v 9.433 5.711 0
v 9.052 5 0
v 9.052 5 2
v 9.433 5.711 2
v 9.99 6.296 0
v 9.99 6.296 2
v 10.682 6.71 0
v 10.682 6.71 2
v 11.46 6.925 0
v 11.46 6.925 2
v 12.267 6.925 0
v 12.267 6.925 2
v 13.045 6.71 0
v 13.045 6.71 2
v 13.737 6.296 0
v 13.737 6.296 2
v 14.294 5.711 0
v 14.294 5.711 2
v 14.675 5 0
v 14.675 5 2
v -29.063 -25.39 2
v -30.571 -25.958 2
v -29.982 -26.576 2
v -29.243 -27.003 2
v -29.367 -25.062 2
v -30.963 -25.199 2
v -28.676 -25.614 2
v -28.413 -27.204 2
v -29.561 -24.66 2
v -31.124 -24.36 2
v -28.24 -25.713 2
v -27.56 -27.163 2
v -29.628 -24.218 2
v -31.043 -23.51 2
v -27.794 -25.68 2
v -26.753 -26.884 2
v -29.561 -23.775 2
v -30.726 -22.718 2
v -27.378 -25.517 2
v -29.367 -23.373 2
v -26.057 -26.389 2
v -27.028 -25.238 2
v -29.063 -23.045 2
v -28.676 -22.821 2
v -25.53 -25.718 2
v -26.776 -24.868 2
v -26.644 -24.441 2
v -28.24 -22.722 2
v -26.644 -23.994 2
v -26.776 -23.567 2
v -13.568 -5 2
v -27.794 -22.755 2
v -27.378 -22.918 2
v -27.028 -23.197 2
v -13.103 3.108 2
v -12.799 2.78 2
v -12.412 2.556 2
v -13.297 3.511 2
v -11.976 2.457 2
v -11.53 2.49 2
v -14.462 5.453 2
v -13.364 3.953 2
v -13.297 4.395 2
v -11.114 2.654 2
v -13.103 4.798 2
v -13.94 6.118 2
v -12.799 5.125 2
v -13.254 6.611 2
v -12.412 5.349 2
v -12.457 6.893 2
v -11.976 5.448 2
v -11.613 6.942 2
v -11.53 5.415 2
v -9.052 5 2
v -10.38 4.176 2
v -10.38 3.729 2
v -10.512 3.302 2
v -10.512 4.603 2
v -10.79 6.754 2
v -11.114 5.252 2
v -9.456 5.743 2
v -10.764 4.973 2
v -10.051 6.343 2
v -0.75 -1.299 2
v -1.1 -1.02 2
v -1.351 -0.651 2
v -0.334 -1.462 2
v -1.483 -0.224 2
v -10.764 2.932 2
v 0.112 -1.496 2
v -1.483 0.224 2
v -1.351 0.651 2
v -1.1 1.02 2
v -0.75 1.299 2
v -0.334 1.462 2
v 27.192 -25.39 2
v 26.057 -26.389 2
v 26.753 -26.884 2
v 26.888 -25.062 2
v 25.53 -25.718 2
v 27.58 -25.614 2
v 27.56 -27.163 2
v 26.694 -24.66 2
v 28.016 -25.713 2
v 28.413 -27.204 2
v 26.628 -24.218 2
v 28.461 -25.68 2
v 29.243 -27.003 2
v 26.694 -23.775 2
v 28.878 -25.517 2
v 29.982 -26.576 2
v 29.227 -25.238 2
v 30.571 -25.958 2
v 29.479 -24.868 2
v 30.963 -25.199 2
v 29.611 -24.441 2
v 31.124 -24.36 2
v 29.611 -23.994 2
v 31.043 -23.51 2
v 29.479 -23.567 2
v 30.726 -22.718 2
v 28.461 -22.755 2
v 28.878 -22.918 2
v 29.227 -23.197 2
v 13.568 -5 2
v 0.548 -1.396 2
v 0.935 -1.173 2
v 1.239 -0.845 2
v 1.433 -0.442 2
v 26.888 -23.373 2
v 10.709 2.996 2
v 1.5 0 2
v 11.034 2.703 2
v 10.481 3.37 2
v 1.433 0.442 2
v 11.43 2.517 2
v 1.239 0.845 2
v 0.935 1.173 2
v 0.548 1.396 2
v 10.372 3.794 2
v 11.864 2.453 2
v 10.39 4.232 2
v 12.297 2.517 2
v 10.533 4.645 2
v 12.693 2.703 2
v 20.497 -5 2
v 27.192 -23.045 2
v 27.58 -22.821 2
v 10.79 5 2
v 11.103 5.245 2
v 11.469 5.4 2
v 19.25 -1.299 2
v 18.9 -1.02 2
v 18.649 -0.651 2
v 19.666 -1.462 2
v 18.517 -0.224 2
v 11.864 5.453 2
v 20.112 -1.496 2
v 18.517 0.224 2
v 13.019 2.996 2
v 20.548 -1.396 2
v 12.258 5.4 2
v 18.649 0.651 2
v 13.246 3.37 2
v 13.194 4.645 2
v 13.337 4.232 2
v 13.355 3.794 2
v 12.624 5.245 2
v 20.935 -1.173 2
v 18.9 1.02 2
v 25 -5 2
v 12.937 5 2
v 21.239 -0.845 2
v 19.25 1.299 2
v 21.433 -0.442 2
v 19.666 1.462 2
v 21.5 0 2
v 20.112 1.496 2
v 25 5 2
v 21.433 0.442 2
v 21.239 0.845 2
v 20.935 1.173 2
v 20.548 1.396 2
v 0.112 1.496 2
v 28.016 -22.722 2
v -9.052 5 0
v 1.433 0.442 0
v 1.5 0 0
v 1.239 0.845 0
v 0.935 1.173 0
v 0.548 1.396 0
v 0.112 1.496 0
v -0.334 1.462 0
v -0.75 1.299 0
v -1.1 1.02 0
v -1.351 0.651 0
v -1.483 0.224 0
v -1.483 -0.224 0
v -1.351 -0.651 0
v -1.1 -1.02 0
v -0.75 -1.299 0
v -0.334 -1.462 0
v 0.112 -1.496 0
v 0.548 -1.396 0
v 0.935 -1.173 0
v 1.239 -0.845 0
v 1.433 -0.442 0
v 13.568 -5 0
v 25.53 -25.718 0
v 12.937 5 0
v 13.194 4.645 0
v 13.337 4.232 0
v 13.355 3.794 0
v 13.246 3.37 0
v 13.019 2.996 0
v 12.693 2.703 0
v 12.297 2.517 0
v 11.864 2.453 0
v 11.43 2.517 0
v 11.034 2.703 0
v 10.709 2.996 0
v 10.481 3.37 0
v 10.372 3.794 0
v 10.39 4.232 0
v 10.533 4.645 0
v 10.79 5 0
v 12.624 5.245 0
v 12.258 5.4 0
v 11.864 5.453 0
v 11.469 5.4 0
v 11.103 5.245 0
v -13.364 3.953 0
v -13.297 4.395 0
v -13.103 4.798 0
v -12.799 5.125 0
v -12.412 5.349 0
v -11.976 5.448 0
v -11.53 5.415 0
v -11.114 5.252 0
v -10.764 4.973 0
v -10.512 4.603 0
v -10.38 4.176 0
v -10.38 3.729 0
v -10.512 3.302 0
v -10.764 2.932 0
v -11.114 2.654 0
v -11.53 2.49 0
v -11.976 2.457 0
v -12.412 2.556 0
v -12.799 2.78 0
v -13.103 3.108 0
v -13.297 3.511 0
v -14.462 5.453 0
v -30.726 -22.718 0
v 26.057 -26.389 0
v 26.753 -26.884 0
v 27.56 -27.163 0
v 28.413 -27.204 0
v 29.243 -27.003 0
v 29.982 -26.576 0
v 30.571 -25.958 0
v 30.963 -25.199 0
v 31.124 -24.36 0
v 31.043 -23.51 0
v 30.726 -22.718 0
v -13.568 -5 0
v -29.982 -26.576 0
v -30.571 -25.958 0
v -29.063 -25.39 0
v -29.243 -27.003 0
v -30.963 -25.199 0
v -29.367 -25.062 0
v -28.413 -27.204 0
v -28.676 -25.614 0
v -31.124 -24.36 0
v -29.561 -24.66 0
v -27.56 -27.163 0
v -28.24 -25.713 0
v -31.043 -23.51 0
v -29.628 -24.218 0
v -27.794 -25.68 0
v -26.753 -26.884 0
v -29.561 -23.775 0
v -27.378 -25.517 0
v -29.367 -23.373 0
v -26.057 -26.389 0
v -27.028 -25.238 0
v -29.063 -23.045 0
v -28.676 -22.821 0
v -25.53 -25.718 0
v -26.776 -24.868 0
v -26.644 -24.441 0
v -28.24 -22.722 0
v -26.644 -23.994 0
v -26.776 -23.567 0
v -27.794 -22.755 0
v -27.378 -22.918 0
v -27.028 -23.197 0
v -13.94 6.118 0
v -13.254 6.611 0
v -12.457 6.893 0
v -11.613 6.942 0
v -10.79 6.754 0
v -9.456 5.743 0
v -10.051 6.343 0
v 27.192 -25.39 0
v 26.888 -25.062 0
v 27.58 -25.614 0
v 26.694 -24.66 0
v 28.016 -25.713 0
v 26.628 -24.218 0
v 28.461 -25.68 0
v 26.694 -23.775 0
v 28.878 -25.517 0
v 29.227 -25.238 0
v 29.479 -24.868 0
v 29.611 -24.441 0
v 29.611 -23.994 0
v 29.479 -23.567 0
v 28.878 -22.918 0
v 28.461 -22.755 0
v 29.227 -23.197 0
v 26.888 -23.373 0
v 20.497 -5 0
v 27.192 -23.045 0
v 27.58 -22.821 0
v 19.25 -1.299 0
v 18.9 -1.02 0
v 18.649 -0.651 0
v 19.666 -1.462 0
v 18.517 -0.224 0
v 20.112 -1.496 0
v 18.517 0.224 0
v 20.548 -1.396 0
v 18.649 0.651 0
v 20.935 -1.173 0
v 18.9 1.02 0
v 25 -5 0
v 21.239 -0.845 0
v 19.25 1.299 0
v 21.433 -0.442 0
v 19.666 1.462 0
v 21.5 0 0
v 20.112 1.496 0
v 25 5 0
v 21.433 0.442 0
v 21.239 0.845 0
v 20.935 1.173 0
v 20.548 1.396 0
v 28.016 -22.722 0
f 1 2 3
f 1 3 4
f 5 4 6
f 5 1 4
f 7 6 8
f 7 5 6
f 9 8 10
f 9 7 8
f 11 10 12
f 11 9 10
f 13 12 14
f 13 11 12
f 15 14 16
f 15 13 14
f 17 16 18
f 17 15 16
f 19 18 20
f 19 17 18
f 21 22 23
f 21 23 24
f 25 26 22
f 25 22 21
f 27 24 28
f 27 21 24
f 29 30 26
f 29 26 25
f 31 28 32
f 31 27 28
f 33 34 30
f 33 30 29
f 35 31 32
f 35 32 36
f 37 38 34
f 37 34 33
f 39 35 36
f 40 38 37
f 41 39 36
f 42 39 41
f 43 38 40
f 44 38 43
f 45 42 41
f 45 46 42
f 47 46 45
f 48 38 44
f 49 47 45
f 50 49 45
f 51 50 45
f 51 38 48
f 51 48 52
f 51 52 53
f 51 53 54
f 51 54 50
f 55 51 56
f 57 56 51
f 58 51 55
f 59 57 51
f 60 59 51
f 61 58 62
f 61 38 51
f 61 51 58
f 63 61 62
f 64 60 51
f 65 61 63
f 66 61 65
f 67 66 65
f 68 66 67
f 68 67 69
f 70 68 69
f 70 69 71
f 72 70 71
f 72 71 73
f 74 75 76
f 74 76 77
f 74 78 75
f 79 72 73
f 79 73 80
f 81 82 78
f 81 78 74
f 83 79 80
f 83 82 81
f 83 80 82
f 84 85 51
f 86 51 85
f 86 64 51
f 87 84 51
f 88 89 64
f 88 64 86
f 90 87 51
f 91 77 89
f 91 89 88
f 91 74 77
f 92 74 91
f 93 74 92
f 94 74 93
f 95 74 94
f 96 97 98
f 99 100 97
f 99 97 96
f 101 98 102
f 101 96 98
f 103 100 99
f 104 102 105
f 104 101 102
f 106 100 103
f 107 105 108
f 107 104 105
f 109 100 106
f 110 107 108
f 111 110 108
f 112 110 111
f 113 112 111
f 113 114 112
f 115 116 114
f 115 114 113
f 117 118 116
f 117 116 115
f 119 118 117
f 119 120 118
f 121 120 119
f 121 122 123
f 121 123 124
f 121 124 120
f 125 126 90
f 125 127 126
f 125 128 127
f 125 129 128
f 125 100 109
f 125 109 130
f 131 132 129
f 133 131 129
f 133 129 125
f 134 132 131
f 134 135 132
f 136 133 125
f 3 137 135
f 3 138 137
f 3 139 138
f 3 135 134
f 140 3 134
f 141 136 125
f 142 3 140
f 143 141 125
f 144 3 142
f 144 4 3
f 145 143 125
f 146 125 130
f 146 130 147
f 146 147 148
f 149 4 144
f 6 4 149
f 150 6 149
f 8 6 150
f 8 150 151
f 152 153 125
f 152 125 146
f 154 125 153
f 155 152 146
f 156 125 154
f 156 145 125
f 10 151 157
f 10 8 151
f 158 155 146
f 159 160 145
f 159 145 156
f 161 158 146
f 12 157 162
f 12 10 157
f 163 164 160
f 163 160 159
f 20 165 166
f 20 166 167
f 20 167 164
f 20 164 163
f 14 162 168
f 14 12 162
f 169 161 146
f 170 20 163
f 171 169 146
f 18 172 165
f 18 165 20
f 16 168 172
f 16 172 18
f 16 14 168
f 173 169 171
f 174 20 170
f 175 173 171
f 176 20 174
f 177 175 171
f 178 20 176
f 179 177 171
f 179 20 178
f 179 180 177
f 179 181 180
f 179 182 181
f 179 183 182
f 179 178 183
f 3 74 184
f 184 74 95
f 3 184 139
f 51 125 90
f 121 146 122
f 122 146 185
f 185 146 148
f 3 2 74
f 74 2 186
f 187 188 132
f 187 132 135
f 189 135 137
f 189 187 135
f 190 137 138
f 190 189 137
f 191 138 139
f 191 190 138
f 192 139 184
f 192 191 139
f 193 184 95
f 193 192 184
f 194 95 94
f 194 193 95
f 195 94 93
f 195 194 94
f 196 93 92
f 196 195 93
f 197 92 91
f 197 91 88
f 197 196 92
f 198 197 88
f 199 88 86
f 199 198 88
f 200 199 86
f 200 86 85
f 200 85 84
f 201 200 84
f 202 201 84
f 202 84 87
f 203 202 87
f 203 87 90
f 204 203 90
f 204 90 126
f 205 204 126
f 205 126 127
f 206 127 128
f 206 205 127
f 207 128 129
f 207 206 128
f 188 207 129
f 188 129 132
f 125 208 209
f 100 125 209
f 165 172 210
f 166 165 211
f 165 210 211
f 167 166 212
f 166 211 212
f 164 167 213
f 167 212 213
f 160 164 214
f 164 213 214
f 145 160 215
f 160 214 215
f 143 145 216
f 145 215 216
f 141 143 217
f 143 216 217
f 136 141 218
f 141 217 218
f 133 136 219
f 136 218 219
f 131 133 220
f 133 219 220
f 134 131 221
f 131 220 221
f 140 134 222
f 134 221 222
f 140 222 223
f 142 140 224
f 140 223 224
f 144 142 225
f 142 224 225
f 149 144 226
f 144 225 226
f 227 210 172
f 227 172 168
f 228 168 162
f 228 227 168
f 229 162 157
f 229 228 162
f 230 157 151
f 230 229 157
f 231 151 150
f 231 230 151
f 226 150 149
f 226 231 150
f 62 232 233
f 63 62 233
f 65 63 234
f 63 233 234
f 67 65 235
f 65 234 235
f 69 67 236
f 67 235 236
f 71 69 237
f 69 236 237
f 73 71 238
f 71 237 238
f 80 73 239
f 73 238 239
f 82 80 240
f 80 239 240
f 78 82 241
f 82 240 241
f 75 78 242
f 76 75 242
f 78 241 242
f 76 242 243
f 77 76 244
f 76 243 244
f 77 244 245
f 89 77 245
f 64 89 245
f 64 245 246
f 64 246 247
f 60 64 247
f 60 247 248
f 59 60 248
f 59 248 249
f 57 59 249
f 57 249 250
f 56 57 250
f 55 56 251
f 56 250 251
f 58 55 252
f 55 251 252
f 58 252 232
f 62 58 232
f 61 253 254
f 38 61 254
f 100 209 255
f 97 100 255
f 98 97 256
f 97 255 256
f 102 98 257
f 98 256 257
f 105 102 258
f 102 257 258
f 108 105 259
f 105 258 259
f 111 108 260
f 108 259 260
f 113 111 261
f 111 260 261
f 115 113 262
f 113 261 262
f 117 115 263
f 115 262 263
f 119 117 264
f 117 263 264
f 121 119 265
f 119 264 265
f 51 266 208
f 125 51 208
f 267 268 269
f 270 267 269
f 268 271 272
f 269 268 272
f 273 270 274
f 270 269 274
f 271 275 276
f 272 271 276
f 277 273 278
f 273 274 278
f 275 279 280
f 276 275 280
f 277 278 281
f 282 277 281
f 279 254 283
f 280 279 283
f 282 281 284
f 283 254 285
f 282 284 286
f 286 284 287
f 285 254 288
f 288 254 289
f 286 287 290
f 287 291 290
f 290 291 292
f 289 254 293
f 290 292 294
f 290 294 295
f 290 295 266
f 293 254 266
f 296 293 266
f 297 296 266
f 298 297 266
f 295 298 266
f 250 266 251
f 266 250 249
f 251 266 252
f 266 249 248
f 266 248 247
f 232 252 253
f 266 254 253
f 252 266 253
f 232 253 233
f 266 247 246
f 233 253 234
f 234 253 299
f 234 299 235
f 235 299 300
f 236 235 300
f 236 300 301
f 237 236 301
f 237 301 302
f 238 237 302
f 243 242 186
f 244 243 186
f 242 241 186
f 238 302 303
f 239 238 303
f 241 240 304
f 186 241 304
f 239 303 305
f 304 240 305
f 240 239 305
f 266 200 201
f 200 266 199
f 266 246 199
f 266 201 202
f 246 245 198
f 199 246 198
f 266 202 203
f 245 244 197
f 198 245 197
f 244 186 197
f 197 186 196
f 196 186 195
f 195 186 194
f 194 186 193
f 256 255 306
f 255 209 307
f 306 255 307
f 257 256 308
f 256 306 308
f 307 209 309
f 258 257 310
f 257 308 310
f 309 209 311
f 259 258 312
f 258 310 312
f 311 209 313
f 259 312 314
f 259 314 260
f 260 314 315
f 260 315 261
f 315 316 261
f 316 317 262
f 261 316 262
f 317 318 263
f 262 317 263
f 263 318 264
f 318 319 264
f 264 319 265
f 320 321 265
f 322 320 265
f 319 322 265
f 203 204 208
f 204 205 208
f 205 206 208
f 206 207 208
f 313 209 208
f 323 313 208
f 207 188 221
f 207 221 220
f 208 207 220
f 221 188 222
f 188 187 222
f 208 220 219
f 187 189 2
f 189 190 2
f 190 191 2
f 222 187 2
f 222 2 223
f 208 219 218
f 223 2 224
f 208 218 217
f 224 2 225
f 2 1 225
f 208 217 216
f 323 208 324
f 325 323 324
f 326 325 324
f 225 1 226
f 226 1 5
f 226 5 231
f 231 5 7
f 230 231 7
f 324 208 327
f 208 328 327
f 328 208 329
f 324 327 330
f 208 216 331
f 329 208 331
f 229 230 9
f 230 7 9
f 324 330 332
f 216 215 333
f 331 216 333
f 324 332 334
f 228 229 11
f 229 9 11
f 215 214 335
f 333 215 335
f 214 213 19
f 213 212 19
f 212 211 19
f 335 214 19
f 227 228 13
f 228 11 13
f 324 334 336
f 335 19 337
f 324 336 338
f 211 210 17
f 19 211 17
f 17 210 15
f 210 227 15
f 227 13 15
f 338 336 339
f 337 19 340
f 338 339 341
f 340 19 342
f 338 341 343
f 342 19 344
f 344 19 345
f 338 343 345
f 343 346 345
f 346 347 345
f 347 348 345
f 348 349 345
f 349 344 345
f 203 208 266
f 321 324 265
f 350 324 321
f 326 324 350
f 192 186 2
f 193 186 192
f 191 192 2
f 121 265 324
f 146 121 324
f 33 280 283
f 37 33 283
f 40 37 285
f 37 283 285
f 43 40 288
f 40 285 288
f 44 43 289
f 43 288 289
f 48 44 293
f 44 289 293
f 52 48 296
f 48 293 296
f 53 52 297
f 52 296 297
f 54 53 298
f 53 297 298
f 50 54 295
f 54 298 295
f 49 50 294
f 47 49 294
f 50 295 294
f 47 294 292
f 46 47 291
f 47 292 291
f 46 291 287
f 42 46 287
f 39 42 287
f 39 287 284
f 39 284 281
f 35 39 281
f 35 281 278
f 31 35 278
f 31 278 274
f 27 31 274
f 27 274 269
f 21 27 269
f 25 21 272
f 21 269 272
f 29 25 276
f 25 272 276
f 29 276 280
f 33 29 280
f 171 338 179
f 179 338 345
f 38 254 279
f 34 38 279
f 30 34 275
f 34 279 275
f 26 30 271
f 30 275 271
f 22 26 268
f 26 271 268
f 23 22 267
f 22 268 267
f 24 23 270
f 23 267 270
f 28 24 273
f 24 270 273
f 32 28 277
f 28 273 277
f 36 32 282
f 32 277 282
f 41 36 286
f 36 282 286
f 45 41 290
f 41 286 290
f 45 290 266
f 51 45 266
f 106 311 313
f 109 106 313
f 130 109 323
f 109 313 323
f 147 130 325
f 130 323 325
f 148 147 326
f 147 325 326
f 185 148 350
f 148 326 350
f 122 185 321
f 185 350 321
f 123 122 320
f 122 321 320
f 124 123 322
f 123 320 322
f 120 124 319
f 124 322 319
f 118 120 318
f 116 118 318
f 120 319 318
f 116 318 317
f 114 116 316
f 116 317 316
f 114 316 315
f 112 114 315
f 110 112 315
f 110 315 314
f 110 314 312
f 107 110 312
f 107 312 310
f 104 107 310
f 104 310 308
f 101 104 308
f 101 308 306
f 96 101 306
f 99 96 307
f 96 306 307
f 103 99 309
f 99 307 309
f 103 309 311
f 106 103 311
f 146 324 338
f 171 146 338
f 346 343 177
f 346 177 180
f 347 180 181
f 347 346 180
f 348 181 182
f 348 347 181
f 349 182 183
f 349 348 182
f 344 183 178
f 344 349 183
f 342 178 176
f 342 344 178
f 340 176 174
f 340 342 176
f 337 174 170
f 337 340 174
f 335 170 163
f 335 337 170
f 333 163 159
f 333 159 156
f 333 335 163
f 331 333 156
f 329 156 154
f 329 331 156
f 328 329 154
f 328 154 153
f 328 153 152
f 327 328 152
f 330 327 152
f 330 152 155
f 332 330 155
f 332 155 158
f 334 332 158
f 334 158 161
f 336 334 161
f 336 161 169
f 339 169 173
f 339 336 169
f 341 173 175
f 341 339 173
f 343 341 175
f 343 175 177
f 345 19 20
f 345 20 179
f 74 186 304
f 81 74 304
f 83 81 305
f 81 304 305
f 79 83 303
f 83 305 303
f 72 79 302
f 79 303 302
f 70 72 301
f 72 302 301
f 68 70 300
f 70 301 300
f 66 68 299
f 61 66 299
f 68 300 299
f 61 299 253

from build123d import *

# Parameters (mm, degrees)
SKETCH_1_W          = 30
SKETCH_1_H          = 10
SKETCH_1_R          = 1.5
EXTRUDE_1_DEPTH     = 2
SKETCH_4_R          = 1.5
EXTRUDE_3_DEPTH     = 2
SKETCH_5_R          = 1.5
CUT_EXTRUDE_2_DEPTH = 42.397139466


with BuildPart() as part:
    # 草图1 → 凸台-拉伸1 (new body)
    with BuildSketch(Plane.XY):
        with Locations((10, 0)):
            Rectangle(SKETCH_1_W, SKETCH_1_H)
        Circle(SKETCH_1_R, mode=Mode.SUBTRACT)
        with Locations((20, 0)):
            Circle(SKETCH_1_R, mode=Mode.SUBTRACT)
    extrude(amount=EXTRUDE_1_DEPTH)

    # 草图4 → 凸台-拉伸3 (add)
    # profile 1 of 3: a face of its own
    with BuildSketch(Plane(origin=(0, 0, 0), x_dir=(-1, 0, 0), z_dir=(0, 0, -1))):
        with BuildLine():
            Line((-30.725715478, -22.717516962), (-20.496502291, -5))
            Line((-20.496502291, -5), (-13.568299061, -5))
            Line((-13.568299061, -5), (-25.529563056, -25.717516962))
            ThreePointArc((-25.529563056, -25.717516962), (-29.627639267, -26.815593174), (-30.725715478, -22.717516962))
        make_face()
        with Locations((-28.127639267, -24.217516962)):
            Circle(SKETCH_4_R, mode=Mode.SUBTRACT)
    # profile 2 of 3: a face of its own
    with BuildSketch(Plane(origin=(0, 0, 0), x_dir=(-1, 0, 0), z_dir=(0, 0, -1))):
        with BuildLine():
            Line((-14.674826287, 5), (-12.937385919, 5))
            ThreePointArc((-12.937385919, 5), (-11.863593392, 5.452636831), (-10.789800864, 5))
            Line((-10.789800864, 5), (-9.052360496, 5))
            ThreePointArc((-9.052360496, 5), (-11.863593392, 6.952636831), (-14.674826287, 5))
        make_face()
    # profile 3 of 3: a face of its own
    with BuildSketch(Plane(origin=(0, 0, 0), x_dir=(-1, 0, 0), z_dir=(0, 0, -1))):
        with BuildLine():
            Line((5, 5), (9.052360496, 5))
            ThreePointArc((9.052360496, 5), (11.613435505, 6.942188809), (14.461669603, 5.452636831))
            Line((14.461669603, 5.452636831), (30.725715478, -22.717516962))
            ThreePointArc((30.725715478, -22.717516962), (29.627639267, -26.815593174), (25.529563056, -25.717516962))
            Line((25.529563056, -25.717516962), (13.568299061, -5))
            Line((13.568299061, -5), (5, -5))
            Line((5, -5), (5, 5))
        make_face()
        with Locations((11.863593392, 3.952636831)):
            Circle(SKETCH_4_R, mode=Mode.SUBTRACT)
        with Locations((28.127639267, -24.217516962)):
            Circle(SKETCH_4_R, mode=Mode.SUBTRACT)
    extrude(amount=-EXTRUDE_3_DEPTH)

    # 草图5 → 切除-拉伸2 (cut, through all)
    with BuildSketch(Plane(origin=(0, 0, 0), x_dir=(-1, 0, 0), z_dir=(0, 0, -1))):
        with Locations((-11.863593392, 3.952636831)):
            Circle(SKETCH_5_R)
    extrude(amount=-CUT_EXTRUDE_2_DEPTH, mode=Mode.SUBTRACT)


solid = part.part
